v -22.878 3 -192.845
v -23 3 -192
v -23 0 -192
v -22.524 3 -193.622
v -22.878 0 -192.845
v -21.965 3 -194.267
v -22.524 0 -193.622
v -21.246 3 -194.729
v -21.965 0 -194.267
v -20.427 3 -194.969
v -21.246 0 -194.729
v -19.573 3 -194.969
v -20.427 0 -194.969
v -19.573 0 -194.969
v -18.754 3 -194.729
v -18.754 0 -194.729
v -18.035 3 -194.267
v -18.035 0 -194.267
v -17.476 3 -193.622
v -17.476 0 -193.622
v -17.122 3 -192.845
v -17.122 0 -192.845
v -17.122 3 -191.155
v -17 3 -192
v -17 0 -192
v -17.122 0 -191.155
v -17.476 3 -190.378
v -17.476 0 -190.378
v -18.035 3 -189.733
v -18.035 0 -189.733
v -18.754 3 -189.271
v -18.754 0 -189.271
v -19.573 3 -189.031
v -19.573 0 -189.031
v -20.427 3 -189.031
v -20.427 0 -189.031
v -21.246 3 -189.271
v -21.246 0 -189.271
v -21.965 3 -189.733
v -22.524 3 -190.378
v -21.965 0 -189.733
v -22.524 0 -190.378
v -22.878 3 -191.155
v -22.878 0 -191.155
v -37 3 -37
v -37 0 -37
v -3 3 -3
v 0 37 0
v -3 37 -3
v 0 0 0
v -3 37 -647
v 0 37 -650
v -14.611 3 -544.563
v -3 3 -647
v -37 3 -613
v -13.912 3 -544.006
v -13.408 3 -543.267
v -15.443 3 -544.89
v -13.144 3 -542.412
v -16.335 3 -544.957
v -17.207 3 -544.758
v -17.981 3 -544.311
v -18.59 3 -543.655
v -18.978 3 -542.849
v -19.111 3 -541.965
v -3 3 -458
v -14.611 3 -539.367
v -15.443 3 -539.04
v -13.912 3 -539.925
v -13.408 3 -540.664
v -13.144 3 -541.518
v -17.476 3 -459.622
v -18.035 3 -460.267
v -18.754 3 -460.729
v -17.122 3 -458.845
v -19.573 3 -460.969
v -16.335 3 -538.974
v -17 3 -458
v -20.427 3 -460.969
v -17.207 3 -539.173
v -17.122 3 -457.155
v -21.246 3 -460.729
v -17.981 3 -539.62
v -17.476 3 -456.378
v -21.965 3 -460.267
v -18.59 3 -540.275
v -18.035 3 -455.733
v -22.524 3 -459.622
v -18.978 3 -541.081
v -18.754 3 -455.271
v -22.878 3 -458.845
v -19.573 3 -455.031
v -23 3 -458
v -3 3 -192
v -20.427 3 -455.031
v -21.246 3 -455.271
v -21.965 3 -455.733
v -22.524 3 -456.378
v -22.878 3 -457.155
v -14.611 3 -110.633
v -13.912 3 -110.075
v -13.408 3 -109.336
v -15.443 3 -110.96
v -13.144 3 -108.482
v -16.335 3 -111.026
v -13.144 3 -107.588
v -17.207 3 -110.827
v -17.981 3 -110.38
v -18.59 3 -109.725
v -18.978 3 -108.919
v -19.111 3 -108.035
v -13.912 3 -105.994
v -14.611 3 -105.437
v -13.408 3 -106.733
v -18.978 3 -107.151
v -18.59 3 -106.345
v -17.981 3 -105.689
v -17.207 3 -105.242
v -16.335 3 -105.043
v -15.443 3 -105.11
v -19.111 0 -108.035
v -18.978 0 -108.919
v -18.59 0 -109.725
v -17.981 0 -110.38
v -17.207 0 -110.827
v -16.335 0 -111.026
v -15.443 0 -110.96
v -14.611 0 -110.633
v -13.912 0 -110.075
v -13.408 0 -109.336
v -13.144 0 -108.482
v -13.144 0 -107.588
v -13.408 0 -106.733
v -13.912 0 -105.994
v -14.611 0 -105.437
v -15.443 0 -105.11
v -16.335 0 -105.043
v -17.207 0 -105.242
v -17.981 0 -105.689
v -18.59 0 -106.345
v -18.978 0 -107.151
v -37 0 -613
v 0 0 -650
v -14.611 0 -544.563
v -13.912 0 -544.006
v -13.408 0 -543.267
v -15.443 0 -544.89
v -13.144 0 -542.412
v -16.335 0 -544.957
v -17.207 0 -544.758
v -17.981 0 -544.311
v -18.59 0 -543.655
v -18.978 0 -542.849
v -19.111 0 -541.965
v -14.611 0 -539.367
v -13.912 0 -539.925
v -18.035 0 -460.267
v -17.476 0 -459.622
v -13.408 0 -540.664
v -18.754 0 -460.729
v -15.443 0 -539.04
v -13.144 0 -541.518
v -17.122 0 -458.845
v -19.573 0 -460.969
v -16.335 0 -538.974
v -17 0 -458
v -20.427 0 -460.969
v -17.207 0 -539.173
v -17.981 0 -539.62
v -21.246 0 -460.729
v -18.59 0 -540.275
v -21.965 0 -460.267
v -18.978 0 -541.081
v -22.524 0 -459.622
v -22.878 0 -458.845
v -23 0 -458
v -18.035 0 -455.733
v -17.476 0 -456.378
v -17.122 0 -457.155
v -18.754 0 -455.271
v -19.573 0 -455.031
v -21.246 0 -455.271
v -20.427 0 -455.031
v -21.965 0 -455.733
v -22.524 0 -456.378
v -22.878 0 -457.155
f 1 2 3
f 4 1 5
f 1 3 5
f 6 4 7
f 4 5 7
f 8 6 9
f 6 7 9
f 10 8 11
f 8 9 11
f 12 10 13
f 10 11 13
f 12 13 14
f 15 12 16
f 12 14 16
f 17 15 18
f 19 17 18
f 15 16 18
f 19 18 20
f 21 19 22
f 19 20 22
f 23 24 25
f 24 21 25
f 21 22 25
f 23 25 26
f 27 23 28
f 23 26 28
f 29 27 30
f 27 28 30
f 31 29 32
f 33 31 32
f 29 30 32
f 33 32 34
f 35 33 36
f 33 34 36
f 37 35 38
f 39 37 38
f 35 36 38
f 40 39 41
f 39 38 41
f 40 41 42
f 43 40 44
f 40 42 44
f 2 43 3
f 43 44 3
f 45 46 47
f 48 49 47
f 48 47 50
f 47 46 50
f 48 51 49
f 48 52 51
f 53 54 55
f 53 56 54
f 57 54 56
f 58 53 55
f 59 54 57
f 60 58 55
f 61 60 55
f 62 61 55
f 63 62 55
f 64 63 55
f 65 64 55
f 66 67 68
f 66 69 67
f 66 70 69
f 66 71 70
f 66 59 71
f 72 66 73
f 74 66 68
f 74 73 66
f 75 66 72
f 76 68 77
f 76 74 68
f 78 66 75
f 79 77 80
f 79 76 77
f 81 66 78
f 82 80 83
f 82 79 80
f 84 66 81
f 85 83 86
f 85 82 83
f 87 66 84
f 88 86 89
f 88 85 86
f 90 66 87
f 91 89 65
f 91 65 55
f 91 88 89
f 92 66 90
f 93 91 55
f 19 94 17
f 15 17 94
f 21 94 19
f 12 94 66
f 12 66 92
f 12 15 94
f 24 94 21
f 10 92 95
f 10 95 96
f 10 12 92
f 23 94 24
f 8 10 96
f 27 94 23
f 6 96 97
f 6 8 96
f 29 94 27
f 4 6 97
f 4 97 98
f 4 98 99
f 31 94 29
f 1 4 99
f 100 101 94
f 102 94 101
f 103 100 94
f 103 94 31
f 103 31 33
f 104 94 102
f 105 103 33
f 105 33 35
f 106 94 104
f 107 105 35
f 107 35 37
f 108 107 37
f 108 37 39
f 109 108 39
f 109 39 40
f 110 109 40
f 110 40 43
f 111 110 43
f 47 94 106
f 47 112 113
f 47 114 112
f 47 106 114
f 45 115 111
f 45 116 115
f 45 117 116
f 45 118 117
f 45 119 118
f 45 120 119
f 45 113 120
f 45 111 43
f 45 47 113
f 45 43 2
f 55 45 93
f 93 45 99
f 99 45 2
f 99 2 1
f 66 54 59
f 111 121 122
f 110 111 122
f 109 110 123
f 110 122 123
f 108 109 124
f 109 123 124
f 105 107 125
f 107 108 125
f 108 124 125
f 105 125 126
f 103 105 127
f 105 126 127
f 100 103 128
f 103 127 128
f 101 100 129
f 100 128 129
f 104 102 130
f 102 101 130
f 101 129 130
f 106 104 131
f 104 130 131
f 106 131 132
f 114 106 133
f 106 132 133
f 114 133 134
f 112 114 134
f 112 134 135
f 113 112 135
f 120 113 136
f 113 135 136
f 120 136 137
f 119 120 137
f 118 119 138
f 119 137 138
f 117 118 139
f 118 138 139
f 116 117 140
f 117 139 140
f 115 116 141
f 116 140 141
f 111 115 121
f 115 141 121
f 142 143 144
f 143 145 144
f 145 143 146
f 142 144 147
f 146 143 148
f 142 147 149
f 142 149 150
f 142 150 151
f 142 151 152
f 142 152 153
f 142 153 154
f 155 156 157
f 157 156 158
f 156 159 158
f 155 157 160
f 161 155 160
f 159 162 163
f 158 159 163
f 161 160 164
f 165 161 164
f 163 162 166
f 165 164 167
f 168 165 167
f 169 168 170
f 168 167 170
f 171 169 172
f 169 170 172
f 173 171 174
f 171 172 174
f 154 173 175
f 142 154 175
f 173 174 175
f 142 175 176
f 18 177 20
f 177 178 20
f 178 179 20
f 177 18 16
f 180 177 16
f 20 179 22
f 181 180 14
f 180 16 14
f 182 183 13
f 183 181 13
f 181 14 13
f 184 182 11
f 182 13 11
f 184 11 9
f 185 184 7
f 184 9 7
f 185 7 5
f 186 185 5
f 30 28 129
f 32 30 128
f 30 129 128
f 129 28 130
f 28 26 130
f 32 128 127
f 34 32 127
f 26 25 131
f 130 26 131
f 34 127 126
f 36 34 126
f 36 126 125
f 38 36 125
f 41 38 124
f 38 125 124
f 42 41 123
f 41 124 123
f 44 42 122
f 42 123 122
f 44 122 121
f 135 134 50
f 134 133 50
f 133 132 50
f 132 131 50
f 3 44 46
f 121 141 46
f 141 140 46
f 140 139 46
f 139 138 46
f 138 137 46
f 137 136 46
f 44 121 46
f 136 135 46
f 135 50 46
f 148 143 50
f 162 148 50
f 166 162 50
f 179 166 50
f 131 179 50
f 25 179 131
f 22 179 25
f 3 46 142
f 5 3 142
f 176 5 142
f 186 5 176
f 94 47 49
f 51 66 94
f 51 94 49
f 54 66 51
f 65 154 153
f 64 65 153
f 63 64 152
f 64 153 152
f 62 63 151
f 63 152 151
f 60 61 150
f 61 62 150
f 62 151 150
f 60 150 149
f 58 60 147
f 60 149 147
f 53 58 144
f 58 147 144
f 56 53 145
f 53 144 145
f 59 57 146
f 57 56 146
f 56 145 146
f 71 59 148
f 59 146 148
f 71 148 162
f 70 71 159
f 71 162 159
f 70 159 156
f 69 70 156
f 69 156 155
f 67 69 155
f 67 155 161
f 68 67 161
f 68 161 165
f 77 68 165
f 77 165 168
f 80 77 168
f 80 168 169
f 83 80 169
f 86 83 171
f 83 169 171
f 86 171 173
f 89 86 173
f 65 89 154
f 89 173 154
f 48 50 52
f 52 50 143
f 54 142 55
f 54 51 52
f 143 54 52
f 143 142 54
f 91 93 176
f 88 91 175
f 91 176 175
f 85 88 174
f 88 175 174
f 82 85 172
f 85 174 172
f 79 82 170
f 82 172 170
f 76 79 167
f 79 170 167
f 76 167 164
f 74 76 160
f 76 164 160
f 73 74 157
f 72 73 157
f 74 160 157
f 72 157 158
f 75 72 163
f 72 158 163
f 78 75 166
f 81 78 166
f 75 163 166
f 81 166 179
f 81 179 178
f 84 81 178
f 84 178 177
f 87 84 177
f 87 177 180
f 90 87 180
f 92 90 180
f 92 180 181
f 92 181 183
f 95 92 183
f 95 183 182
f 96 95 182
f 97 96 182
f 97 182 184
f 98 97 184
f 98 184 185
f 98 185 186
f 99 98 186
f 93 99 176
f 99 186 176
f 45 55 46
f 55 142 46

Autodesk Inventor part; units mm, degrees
ref_plane "YZ Plane" through (0, 0, 0) normal (1, 0, 0) x (0, 1, 0)
ref_plane "XZ Plane" through (0, 0, 0) normal (0, 1, 0) x (-1, 0, 0)
ref_plane "XY Plane" through (0, 0, 0) normal (0, 0, 1) x (1, 0, 0)
sketch "Sketch1" plane through (0, 0, 0) normal (0, 1, 0) x (-1, 0, 0)
  line L0 (0, 0) -> (0, -650)
  line L1 (0, -650) -> (650, -650)
  line L2 (650, -650) -> (650, 0)
  line L3 (650, 0) -> (0, 0)
  line L4 (0, 0) -> (3, 0)
  line L5 (3, -3) -> (3, -647)
  line L6 (3, -650) -> (0, -650)
  line L7 (0, -650) -> (0, -647)
  line L8 (650, -647) -> (650, -650)
  line L9 (650, -650) -> (647, -650)
  line L10 (647, -650) -> (647, 0)
  line L11 (647, 0) -> (650, 0)
  line L12 (650, 0) -> (650, -3)
  line L13 (0, -3) -> (0, 0)
  line L14 (0, 0) -> (0, -37)
  line L15 (650, -37) -> (650, 0)
  line L16 (650, 0) -> (613, 0)
  line L17 (613, 0) -> (613, -650)
  line L18 (613, -650) -> (650, -650)
  line L19 (650, -650) -> (650, -613)
  line L20 (0, -613) -> (0, -650)
  line L21 (0, -650) -> (37, -650)
  line L22 (37, 0) -> (0, 0)
  line L23 (3, -147.3087) -> (3, -94.9828)
  line L24 (147.3087, -3) -> (94.9828, -3)
  circle A0 centre (16.1109, -108.0348) radius 3
  line L25 (0, -650) -> (3, -650)
  line L26 (0, -647) -> (0, -650)
  line L27 (0, -650) -> (0, -613)
  line L28 (37, -650) -> (0, -650)
  line L29 (3, -502.6913) -> (3, -555.0172)
  line L30 (147.3087, -647) -> (94.9828, -647)
  circle A1 centre (16.1109, -541.9652) radius 3
  line L31 (37, -650) -> (37, -37)
  line L32 (37, -3) -> (37, 0)
  line L33 (650, -3) -> (34.9546, -3)
  line L34 (34.9546, -647) -> (650, -647)
  line L35 (37, -37) -> (0, 0)
  line L36 (37, -613) -> (0, -650)
  line L37 (0, -650) -> (3, -647)
  line L38 (3, -647) -> (3, -3)
  line L39 (3, -3) -> (0, 0)
  line L40 (3, -325) -> (3, -458)
  line L41 (3, -458) -> (20, -458)
  line L42 (3, -325) -> (3, -192)
  line L43 (3, -192) -> (20, -192)
  circle A2 centre (20, -192) radius 3
  circle A3 centre (20, -458) radius 3
  line L44 (325, -650) -> (192, -650)
  line L45 (192, -650) -> (192, -630)
  circle A4 centre (192, -630) radius 3
  line L46 (3, -458) -> (3, -475)
  line L47 (3, -475) -> (647, -475)
  line L48 (3, -475) -> (3, -478)
  line L49 (3, -478) -> (647, -478)
  line L50 (192, -630) -> (175, -630)
  line L51 (192, -630) -> (209, -630)
  line L52 (209, -630) -> (209, -478)
  line L53 (175, -630) -> (175, -478)
  point P0 (37, -647)
  dimension "d0" = 650
  dimension "d1" = 650
  dimension "d2" = 650
  dimension "d3" = 3
  dimension "d4" = 650
  dimension "d5" = 3
  dimension "d6" = 3
  dimension "d7" = 650
  dimension "d8" = 3
  dimension "d9" = 650
  dimension "d10" = 37
  dimension "d12" = 37
  dimension "d13" = 650
  dimension "d14" = 37
  dimension "d15" = 650
  dimension "d16" = 37
  dimension "d28" = 6
  dimension "d33" = 133
  dimension "d34" = 17
  dimension "d35" = 133
  dimension "d36" = 17
  dimension "d37" = 6
  dimension "d38" = 6
  dimension "d41" = 133
  dimension "d42" = 20
  dimension "d43" = 6
  dimension "d44" = 17
  dimension "d45" = 3
  dimension "d46" = 17
  dimension "d47" = 17
extrude "Extrusion1" add sketch "Sketch1" along normal blind 3 contours L35 L5 L36 L0 | A2 | A3 | L35 L31 L47 L5 | L31 L49 L5 L47 | L31 L36 L5 L49
extrude "Extrusion2" add sketch "Sketch1" along normal blind 37 contours L35 L5 L36 L0
extrude "Extrusion3" cut sketch "Sketch1" along normal blind 3 contours A2 | A3
properties part number "body_outer_L"
